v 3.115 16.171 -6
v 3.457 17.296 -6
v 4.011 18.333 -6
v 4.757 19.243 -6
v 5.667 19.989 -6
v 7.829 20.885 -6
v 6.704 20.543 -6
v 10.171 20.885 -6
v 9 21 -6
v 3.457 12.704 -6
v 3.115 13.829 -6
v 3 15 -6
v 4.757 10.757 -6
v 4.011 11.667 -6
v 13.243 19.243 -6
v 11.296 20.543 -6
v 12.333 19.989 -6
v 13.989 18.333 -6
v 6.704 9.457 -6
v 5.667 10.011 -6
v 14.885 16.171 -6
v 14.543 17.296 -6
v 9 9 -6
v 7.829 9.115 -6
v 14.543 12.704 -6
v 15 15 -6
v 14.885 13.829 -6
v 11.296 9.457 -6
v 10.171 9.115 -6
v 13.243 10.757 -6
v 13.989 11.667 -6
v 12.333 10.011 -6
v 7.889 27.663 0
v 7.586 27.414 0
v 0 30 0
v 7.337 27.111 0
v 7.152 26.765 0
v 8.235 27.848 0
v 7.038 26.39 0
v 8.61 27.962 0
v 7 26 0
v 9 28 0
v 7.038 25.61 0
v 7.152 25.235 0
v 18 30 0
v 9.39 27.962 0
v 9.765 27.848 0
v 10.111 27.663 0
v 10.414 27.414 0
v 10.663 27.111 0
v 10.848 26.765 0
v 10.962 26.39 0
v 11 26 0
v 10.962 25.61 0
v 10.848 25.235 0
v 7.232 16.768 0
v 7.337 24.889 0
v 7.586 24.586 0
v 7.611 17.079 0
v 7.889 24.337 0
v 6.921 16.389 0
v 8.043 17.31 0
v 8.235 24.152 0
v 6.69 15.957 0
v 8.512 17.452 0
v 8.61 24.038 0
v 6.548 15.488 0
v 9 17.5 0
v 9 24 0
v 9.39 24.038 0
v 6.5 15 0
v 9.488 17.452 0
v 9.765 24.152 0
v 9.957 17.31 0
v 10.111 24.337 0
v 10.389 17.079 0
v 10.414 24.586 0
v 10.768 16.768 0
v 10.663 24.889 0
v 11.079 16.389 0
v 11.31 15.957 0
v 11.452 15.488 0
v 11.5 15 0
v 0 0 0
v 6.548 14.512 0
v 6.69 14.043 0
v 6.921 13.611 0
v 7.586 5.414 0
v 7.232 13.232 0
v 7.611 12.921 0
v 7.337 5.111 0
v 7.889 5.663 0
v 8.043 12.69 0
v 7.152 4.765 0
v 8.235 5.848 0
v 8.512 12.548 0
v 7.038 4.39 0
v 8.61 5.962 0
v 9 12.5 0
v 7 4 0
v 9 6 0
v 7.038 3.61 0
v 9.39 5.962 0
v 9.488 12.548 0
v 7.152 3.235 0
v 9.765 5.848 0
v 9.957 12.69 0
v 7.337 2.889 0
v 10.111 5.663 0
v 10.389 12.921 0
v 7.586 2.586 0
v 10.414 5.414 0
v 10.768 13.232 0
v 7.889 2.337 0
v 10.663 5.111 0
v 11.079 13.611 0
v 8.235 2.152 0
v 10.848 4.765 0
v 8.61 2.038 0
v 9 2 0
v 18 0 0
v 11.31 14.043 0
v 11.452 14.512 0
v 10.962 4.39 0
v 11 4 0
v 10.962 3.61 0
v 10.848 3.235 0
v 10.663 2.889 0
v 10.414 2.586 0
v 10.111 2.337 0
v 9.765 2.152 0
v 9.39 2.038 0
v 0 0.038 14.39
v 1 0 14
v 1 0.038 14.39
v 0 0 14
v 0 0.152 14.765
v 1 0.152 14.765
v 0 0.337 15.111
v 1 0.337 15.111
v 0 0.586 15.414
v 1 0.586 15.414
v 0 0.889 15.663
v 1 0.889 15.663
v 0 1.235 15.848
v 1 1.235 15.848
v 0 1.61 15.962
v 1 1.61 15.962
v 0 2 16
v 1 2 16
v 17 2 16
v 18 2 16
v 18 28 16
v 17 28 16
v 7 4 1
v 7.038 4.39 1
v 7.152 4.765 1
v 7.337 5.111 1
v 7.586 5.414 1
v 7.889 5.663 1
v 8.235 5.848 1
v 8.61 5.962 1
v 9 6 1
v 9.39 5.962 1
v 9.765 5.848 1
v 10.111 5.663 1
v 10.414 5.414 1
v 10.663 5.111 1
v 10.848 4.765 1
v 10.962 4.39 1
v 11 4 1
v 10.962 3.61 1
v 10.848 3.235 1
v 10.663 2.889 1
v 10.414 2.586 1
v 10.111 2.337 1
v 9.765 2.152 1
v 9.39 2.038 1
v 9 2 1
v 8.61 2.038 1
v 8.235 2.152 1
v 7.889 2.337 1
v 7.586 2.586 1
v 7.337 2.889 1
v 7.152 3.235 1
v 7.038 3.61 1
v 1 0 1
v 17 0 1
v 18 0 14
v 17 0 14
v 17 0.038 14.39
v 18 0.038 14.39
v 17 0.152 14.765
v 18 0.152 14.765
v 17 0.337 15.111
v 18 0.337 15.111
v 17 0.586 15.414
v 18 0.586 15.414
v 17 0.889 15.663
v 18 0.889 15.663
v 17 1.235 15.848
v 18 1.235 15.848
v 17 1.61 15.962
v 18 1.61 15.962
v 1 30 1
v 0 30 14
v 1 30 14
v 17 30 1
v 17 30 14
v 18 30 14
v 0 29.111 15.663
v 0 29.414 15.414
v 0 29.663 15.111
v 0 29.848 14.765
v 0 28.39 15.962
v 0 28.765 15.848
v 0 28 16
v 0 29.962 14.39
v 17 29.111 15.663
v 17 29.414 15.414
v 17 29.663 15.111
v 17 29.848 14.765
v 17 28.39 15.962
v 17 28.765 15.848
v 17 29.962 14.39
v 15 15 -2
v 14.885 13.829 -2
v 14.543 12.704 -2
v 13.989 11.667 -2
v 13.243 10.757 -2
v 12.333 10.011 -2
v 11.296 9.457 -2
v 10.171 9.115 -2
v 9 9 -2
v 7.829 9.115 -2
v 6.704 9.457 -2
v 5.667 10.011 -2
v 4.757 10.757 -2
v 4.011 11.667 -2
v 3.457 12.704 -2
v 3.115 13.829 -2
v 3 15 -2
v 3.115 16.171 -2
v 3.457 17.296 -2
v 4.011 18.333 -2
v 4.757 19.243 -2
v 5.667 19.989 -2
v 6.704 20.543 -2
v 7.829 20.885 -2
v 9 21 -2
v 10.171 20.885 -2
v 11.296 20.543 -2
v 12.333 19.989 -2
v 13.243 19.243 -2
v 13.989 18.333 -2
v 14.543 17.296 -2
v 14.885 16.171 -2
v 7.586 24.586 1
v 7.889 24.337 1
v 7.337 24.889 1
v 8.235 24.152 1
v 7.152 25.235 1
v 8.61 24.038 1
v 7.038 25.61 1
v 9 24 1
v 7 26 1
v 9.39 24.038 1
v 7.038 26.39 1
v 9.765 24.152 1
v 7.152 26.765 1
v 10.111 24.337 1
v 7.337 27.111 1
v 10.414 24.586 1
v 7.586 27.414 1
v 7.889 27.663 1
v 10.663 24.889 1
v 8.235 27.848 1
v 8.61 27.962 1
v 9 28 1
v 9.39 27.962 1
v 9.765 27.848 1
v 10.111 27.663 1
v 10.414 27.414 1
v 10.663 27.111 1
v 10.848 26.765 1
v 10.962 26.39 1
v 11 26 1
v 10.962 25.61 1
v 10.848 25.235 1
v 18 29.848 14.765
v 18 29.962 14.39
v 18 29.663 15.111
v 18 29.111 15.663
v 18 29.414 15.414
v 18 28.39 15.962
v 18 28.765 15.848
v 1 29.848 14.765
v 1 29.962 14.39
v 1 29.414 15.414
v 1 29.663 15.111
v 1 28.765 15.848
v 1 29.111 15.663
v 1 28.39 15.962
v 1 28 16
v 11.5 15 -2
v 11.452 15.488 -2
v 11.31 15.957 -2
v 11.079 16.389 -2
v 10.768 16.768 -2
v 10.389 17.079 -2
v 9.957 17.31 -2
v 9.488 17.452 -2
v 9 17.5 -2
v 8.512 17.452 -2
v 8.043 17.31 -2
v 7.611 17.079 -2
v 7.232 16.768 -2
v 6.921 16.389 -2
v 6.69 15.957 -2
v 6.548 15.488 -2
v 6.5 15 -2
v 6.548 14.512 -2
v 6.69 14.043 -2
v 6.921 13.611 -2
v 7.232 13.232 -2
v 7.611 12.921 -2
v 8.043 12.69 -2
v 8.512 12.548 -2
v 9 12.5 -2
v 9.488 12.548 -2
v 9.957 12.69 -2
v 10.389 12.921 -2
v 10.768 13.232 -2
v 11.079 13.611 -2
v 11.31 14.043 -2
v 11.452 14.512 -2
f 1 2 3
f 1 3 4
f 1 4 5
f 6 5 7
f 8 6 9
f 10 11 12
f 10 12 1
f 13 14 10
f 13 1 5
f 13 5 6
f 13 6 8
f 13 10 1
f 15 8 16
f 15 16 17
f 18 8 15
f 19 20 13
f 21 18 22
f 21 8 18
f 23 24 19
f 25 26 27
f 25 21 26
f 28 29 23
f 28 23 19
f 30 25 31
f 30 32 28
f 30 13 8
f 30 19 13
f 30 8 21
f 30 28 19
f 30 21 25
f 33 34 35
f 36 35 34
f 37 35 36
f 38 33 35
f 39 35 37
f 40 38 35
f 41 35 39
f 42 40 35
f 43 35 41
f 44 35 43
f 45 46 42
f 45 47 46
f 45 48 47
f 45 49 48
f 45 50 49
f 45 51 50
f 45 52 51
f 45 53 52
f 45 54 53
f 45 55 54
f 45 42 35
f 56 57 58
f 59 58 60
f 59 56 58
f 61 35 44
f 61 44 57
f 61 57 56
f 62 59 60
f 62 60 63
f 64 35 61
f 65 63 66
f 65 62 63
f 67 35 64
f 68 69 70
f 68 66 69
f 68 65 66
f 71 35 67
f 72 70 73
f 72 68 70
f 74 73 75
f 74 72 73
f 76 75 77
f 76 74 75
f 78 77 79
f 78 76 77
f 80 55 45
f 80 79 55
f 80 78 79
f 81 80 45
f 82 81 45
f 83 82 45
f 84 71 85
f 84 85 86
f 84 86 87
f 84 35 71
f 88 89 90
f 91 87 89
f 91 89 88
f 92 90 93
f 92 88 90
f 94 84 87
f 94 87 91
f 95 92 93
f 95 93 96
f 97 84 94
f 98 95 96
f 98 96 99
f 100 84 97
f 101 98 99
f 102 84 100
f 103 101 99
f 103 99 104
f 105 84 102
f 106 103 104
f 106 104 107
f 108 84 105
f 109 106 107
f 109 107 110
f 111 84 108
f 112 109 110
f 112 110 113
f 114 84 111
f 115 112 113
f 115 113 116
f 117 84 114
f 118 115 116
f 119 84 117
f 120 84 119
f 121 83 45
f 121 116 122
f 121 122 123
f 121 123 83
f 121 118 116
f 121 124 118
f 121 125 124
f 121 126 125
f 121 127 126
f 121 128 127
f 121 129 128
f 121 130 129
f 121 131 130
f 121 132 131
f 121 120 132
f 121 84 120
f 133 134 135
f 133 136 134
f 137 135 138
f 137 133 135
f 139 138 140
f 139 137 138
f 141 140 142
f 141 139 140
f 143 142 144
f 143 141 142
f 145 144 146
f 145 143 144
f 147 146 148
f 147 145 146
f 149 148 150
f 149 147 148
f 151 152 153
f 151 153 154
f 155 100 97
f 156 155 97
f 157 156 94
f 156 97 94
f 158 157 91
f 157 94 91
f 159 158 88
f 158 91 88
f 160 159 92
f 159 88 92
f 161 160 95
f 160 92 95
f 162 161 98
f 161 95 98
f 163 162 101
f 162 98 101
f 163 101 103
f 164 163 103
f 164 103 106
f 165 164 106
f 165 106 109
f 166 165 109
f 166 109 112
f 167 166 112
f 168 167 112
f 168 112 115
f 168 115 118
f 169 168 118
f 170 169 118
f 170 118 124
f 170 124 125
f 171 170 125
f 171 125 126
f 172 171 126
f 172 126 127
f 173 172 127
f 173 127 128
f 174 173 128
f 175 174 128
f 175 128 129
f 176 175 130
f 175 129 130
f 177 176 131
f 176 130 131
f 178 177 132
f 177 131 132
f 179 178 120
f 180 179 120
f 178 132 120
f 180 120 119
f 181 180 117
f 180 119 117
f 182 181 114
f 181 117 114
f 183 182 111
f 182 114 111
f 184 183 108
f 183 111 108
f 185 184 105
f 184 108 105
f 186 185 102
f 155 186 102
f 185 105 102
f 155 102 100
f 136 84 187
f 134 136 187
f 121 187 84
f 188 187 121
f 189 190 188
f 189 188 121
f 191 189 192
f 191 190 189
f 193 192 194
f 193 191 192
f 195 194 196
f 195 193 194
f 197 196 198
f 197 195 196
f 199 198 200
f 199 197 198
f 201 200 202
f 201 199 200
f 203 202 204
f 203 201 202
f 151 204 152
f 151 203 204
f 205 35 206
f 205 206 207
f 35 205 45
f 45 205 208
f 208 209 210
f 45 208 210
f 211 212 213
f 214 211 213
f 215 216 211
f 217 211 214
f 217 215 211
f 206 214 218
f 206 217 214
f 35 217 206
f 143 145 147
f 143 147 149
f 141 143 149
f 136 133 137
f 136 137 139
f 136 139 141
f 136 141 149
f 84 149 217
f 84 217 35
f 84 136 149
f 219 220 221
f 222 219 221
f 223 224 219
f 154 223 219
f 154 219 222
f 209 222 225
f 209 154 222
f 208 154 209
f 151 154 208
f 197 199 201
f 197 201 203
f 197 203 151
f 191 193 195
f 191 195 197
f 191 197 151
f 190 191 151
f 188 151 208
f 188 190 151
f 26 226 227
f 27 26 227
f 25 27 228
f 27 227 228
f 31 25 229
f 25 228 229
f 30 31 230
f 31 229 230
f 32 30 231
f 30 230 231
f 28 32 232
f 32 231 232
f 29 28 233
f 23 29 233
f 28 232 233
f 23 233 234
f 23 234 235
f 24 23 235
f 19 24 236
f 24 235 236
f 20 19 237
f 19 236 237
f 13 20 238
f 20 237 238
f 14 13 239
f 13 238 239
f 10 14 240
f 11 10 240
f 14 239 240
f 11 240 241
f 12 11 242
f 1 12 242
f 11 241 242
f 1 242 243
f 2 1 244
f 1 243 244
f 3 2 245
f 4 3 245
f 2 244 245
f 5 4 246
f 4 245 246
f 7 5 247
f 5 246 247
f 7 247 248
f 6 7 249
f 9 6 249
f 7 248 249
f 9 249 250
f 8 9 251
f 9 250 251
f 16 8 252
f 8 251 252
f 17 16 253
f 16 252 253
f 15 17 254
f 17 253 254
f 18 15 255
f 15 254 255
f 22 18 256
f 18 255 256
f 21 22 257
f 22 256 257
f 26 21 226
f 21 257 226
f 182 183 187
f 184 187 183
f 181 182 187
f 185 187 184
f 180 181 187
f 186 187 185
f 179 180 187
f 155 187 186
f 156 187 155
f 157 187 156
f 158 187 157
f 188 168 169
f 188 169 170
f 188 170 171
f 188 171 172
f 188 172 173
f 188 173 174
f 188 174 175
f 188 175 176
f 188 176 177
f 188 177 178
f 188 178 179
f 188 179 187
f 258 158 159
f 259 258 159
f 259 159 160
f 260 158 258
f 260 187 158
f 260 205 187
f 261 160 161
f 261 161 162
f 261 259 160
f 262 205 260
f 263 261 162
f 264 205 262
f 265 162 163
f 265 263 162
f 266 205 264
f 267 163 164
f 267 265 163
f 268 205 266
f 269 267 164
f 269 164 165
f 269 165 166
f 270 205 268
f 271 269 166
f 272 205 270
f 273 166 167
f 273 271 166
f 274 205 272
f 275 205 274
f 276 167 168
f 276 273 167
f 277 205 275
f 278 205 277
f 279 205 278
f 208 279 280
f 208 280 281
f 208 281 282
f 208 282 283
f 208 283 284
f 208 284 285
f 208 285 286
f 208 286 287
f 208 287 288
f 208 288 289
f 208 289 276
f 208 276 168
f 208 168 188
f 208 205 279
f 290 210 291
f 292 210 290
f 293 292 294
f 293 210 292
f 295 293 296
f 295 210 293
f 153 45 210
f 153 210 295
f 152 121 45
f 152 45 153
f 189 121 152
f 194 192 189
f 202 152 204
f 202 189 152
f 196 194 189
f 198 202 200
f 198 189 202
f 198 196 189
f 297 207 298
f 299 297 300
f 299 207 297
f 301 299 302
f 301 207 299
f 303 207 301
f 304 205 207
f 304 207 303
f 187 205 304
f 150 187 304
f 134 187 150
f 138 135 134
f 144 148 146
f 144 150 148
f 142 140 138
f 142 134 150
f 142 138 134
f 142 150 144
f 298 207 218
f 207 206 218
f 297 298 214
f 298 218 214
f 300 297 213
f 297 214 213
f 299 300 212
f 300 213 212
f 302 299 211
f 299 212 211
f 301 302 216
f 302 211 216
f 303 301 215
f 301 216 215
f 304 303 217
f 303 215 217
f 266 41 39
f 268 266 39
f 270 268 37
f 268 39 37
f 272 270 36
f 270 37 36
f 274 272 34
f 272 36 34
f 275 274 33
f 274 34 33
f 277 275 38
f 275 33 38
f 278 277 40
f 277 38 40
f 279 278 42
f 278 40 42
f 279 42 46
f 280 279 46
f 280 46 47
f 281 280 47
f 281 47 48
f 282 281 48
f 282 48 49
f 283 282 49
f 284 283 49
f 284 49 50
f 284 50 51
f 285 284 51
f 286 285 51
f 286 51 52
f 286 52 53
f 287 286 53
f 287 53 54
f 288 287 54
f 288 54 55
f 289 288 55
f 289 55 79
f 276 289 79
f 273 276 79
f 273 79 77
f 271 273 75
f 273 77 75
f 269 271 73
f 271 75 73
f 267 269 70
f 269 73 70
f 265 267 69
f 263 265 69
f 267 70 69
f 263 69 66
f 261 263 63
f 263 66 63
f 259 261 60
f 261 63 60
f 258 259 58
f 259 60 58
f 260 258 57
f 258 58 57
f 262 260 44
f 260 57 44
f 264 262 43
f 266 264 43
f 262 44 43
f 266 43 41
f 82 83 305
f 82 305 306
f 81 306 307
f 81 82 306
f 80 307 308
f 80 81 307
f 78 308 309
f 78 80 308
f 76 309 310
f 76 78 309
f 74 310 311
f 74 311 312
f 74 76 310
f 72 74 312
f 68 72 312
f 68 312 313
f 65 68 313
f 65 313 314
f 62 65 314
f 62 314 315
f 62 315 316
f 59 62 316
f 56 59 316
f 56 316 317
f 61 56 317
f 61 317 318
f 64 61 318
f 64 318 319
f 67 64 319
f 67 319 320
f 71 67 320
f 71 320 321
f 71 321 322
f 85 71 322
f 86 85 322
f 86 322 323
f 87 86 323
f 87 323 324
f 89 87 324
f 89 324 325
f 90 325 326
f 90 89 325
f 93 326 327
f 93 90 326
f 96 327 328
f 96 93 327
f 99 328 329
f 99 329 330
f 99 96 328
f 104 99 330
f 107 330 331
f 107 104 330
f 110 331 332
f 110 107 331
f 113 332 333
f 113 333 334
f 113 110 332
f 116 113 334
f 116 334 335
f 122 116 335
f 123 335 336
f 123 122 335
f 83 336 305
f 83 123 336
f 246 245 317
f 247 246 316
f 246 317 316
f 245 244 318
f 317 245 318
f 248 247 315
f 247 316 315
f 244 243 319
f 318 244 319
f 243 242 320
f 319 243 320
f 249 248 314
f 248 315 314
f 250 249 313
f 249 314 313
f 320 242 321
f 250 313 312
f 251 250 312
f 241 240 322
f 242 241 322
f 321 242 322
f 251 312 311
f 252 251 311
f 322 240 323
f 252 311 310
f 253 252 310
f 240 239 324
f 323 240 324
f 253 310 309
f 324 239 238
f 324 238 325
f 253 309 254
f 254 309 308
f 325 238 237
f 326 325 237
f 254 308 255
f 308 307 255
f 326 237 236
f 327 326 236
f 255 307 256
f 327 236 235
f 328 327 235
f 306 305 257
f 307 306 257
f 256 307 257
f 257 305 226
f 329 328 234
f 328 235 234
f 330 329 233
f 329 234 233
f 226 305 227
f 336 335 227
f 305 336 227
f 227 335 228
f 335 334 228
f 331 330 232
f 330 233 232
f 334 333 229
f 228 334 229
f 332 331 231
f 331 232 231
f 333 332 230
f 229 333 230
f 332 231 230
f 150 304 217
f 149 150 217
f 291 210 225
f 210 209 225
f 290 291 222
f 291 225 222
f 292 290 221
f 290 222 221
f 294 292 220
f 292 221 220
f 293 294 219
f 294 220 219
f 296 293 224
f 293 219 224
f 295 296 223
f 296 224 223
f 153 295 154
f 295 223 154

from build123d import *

# Parameters (mm, degrees)
F1_DEPTH = 30
F2_R     = 2.5
F3_DEPTH = 3
F4_R     = 6
F4_R_2   = 2.5
F5_DEPTH = 4
F6_R     = 2
F7_D     = 4
F7_DEPTH = 15
F7_TIP   = 1.2017212381


with BuildPart() as f1:
    # F0 (on Front) → F1 (new body)
    with BuildSketch(Plane.XZ):
        Polygon((0, 1), (0, 0), (18, 0), (18, 1), (18, 16), (17, 16), (17, 1), (1, 1), (1, 16), (0, 16), align=None)
    extrude(amount=-F1_DEPTH)

    # F2 (on face) → F3 (join)
    with BuildSketch(Plane.XY.offset(1)):
        with Locations((9, 15)):
            Circle(F2_R)
    extrude(amount=-F3_DEPTH)

    # F4 (on face) → F5 (join)
    with BuildSketch(Plane(origin=(0, 0, -2), x_dir=(1, 0, 0), z_dir=(0, 0, -1))):
        with Locations((9, -15)):
            Circle(F4_R)
        with Locations((9, -15)):
            Circle(F4_R_2, mode=Mode.SUBTRACT)
        with Locations((9, -15)):
            Circle(F4_R_2)
    extrude(amount=F5_DEPTH)

    # F6
    f6_edges = [f1.edges().sort_by_distance(p)[0] for p in [
        (17.5, 0, 16),
        (17.5, 30, 16),
        (0.5, 30, 16),
        (0.5, 0, 16),
    ]]
    fillet(f6_edges, radius=F6_R)

    # F7
    with Locations(Plane.XY.offset(1)):
        with Locations((9, 4), (9, 26)):
            Hole(F7_D / 2, depth=F7_DEPTH)
            with Locations((0, 0, -(F7_DEPTH + F7_TIP / 2))):  # 118° drill point
                Cone(0, F7_D / 2, F7_TIP, mode=Mode.SUBTRACT)


solid = f1.part
